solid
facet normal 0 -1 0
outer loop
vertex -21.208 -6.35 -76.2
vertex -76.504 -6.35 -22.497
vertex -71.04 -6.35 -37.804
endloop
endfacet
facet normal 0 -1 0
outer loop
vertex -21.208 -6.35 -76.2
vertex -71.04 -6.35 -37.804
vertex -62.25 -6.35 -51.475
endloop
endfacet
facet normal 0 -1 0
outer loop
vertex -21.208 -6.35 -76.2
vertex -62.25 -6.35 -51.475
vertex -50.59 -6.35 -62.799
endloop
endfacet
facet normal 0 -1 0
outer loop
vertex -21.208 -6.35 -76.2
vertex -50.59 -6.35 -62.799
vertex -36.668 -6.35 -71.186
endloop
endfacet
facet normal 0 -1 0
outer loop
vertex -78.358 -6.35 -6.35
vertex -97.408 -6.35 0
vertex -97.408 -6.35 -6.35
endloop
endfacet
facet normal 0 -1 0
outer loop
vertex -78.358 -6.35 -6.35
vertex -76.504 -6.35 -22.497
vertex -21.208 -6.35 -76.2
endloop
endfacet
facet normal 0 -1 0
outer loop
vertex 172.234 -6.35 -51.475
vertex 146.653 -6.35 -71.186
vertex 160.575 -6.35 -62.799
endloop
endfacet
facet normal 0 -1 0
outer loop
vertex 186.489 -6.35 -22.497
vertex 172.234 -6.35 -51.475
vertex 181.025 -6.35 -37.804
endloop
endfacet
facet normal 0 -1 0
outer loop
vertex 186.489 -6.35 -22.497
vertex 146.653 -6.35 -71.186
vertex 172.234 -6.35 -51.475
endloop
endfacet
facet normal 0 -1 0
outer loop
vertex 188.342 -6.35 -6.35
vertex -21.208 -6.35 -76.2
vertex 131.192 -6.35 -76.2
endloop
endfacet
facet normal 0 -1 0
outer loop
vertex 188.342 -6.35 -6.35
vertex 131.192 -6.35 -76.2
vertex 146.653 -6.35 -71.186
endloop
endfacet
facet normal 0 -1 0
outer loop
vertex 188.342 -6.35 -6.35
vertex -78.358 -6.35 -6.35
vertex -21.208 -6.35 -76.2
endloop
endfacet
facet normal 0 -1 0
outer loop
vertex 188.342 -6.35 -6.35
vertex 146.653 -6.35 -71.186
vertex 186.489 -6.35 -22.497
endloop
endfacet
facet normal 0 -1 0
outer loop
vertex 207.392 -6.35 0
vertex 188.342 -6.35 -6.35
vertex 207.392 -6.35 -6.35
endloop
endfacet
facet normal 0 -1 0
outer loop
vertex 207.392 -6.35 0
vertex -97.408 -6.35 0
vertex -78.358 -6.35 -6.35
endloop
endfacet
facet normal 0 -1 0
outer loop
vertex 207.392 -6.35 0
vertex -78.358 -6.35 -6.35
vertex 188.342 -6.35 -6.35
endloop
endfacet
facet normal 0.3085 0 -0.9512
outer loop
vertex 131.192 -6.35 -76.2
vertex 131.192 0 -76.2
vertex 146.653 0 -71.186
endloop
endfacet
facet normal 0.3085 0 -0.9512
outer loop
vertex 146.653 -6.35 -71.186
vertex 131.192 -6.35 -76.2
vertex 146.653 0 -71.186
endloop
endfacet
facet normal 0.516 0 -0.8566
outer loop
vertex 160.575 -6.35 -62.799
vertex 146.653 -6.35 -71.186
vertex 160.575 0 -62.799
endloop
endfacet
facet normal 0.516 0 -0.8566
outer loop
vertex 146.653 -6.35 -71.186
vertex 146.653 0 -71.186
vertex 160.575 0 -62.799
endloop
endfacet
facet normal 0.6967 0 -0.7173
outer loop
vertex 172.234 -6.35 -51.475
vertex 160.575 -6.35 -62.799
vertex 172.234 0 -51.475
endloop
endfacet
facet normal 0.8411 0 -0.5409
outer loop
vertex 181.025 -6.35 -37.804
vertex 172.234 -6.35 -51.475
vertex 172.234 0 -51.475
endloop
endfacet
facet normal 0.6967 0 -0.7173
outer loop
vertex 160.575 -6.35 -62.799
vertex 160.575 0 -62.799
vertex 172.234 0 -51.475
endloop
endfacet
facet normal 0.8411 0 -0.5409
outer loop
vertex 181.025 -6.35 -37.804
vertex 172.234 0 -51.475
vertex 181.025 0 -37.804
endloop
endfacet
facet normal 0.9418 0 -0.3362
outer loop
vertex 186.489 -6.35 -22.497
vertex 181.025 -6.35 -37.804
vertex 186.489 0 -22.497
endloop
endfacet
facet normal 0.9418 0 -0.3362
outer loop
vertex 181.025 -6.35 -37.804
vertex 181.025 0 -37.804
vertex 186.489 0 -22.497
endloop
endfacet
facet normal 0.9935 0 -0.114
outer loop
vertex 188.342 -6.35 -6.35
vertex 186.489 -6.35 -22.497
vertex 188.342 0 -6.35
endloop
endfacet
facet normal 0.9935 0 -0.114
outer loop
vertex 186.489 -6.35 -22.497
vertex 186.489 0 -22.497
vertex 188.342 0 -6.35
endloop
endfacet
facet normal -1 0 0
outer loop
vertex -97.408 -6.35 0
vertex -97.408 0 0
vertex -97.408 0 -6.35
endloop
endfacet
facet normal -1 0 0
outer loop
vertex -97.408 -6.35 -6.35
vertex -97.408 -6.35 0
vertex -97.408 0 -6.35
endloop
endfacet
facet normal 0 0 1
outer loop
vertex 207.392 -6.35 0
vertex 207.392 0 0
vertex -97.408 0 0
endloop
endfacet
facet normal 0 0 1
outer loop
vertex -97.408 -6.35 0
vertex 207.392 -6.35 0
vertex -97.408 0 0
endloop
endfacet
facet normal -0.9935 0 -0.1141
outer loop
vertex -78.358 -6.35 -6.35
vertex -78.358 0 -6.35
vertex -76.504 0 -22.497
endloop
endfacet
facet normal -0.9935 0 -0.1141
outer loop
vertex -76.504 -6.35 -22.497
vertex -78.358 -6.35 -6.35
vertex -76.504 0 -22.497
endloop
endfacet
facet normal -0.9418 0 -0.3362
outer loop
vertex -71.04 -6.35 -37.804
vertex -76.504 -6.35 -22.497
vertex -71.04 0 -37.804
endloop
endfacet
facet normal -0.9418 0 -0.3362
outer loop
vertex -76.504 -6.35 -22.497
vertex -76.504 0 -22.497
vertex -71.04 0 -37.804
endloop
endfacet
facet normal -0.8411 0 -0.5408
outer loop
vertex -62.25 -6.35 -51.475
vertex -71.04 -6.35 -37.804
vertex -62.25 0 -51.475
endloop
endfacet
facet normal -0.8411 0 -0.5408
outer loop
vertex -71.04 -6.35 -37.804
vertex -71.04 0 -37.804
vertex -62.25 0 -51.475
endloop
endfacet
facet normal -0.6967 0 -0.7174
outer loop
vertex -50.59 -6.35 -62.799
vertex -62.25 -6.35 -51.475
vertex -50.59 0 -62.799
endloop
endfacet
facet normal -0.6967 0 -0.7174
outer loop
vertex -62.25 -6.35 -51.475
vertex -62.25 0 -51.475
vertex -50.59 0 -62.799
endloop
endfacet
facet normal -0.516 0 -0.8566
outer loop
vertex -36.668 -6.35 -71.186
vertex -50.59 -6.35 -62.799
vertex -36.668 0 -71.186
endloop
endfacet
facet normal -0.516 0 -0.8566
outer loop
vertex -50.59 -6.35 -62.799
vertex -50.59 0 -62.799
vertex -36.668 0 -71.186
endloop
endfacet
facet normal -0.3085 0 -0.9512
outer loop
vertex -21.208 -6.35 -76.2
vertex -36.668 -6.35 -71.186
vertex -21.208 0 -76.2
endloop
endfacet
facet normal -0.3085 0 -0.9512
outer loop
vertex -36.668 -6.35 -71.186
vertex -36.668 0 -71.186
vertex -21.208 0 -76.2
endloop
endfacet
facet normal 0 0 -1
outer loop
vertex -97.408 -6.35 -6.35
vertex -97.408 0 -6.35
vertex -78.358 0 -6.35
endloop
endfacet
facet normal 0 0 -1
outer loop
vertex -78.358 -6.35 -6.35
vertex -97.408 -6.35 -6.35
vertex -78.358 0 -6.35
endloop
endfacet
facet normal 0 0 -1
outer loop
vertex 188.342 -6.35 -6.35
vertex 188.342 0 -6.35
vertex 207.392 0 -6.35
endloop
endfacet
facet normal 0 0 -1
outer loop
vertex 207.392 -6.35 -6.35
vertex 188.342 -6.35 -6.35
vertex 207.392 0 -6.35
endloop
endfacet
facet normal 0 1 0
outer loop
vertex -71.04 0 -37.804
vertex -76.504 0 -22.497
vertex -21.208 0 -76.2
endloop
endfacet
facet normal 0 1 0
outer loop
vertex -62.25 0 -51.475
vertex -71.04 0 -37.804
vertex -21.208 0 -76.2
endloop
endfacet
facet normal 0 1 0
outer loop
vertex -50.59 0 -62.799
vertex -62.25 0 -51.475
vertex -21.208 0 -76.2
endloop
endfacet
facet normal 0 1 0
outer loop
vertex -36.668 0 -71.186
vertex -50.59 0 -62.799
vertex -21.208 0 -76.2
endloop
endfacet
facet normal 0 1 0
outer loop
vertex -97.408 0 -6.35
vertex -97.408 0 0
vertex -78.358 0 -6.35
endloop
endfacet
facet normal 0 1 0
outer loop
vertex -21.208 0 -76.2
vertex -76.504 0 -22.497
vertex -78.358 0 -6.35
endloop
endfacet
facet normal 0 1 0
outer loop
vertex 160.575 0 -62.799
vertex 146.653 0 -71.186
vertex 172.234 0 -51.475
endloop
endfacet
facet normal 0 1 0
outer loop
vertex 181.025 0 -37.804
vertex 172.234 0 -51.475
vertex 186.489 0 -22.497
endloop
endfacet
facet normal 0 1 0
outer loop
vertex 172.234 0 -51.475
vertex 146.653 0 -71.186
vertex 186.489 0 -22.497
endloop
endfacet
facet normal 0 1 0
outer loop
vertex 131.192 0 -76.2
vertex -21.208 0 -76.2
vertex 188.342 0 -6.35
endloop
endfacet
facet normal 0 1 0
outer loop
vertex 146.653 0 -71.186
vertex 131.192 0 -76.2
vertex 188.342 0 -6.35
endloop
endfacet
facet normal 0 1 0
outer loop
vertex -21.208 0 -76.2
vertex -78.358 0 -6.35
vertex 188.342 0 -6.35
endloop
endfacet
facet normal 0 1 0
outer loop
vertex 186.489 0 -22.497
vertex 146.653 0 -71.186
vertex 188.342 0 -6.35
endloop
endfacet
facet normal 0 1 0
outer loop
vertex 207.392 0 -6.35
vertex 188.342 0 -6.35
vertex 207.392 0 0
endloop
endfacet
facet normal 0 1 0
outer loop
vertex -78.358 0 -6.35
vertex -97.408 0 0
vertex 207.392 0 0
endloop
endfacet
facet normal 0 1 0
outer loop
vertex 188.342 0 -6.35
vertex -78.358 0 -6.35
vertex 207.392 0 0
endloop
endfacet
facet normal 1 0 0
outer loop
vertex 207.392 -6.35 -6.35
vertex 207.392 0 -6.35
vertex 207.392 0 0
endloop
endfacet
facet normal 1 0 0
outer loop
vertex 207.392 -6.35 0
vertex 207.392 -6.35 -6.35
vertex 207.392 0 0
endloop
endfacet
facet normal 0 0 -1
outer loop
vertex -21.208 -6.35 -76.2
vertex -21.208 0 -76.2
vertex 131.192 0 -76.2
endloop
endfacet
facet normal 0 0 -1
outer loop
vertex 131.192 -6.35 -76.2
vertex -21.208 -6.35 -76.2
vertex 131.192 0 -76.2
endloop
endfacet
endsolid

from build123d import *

# Parameters (mm, degrees)
F1_DEPTH = 6.35


with BuildPart() as f1:
    # F0 (on Front) → F1 (new body)
    with BuildSketch(Plane.XZ):
        with BuildLine():
            Line((-72.007763, 0), (-97.407763, 0))
            Line((-97.407763, 0), (-97.407763, -6.35))
            Line((-97.407763, -6.35), (-78.357763, -6.35))
            ThreePointArc((-78.357763, -6.35), (-62.249709, -51.475229), (-21.207763, -76.2))
            Line((-21.207763, -76.2), (131.192237, -76.2))
            ThreePointArc((131.192237, -76.2), (172.234183, -51.475229), (188.342237, -6.35))
            Line((188.342237, -6.35), (207.392237, -6.35))
            Line((207.392237, -6.35), (207.392237, 0))
            Line((207.392237, 0), (181.992237, 0))
            Line((181.992237, 0), (54.992237, 0))
            Line((54.992237, 0), (-72.007763, 0))
        make_face()
    extrude(amount=F1_DEPTH)


solid = f1.part
